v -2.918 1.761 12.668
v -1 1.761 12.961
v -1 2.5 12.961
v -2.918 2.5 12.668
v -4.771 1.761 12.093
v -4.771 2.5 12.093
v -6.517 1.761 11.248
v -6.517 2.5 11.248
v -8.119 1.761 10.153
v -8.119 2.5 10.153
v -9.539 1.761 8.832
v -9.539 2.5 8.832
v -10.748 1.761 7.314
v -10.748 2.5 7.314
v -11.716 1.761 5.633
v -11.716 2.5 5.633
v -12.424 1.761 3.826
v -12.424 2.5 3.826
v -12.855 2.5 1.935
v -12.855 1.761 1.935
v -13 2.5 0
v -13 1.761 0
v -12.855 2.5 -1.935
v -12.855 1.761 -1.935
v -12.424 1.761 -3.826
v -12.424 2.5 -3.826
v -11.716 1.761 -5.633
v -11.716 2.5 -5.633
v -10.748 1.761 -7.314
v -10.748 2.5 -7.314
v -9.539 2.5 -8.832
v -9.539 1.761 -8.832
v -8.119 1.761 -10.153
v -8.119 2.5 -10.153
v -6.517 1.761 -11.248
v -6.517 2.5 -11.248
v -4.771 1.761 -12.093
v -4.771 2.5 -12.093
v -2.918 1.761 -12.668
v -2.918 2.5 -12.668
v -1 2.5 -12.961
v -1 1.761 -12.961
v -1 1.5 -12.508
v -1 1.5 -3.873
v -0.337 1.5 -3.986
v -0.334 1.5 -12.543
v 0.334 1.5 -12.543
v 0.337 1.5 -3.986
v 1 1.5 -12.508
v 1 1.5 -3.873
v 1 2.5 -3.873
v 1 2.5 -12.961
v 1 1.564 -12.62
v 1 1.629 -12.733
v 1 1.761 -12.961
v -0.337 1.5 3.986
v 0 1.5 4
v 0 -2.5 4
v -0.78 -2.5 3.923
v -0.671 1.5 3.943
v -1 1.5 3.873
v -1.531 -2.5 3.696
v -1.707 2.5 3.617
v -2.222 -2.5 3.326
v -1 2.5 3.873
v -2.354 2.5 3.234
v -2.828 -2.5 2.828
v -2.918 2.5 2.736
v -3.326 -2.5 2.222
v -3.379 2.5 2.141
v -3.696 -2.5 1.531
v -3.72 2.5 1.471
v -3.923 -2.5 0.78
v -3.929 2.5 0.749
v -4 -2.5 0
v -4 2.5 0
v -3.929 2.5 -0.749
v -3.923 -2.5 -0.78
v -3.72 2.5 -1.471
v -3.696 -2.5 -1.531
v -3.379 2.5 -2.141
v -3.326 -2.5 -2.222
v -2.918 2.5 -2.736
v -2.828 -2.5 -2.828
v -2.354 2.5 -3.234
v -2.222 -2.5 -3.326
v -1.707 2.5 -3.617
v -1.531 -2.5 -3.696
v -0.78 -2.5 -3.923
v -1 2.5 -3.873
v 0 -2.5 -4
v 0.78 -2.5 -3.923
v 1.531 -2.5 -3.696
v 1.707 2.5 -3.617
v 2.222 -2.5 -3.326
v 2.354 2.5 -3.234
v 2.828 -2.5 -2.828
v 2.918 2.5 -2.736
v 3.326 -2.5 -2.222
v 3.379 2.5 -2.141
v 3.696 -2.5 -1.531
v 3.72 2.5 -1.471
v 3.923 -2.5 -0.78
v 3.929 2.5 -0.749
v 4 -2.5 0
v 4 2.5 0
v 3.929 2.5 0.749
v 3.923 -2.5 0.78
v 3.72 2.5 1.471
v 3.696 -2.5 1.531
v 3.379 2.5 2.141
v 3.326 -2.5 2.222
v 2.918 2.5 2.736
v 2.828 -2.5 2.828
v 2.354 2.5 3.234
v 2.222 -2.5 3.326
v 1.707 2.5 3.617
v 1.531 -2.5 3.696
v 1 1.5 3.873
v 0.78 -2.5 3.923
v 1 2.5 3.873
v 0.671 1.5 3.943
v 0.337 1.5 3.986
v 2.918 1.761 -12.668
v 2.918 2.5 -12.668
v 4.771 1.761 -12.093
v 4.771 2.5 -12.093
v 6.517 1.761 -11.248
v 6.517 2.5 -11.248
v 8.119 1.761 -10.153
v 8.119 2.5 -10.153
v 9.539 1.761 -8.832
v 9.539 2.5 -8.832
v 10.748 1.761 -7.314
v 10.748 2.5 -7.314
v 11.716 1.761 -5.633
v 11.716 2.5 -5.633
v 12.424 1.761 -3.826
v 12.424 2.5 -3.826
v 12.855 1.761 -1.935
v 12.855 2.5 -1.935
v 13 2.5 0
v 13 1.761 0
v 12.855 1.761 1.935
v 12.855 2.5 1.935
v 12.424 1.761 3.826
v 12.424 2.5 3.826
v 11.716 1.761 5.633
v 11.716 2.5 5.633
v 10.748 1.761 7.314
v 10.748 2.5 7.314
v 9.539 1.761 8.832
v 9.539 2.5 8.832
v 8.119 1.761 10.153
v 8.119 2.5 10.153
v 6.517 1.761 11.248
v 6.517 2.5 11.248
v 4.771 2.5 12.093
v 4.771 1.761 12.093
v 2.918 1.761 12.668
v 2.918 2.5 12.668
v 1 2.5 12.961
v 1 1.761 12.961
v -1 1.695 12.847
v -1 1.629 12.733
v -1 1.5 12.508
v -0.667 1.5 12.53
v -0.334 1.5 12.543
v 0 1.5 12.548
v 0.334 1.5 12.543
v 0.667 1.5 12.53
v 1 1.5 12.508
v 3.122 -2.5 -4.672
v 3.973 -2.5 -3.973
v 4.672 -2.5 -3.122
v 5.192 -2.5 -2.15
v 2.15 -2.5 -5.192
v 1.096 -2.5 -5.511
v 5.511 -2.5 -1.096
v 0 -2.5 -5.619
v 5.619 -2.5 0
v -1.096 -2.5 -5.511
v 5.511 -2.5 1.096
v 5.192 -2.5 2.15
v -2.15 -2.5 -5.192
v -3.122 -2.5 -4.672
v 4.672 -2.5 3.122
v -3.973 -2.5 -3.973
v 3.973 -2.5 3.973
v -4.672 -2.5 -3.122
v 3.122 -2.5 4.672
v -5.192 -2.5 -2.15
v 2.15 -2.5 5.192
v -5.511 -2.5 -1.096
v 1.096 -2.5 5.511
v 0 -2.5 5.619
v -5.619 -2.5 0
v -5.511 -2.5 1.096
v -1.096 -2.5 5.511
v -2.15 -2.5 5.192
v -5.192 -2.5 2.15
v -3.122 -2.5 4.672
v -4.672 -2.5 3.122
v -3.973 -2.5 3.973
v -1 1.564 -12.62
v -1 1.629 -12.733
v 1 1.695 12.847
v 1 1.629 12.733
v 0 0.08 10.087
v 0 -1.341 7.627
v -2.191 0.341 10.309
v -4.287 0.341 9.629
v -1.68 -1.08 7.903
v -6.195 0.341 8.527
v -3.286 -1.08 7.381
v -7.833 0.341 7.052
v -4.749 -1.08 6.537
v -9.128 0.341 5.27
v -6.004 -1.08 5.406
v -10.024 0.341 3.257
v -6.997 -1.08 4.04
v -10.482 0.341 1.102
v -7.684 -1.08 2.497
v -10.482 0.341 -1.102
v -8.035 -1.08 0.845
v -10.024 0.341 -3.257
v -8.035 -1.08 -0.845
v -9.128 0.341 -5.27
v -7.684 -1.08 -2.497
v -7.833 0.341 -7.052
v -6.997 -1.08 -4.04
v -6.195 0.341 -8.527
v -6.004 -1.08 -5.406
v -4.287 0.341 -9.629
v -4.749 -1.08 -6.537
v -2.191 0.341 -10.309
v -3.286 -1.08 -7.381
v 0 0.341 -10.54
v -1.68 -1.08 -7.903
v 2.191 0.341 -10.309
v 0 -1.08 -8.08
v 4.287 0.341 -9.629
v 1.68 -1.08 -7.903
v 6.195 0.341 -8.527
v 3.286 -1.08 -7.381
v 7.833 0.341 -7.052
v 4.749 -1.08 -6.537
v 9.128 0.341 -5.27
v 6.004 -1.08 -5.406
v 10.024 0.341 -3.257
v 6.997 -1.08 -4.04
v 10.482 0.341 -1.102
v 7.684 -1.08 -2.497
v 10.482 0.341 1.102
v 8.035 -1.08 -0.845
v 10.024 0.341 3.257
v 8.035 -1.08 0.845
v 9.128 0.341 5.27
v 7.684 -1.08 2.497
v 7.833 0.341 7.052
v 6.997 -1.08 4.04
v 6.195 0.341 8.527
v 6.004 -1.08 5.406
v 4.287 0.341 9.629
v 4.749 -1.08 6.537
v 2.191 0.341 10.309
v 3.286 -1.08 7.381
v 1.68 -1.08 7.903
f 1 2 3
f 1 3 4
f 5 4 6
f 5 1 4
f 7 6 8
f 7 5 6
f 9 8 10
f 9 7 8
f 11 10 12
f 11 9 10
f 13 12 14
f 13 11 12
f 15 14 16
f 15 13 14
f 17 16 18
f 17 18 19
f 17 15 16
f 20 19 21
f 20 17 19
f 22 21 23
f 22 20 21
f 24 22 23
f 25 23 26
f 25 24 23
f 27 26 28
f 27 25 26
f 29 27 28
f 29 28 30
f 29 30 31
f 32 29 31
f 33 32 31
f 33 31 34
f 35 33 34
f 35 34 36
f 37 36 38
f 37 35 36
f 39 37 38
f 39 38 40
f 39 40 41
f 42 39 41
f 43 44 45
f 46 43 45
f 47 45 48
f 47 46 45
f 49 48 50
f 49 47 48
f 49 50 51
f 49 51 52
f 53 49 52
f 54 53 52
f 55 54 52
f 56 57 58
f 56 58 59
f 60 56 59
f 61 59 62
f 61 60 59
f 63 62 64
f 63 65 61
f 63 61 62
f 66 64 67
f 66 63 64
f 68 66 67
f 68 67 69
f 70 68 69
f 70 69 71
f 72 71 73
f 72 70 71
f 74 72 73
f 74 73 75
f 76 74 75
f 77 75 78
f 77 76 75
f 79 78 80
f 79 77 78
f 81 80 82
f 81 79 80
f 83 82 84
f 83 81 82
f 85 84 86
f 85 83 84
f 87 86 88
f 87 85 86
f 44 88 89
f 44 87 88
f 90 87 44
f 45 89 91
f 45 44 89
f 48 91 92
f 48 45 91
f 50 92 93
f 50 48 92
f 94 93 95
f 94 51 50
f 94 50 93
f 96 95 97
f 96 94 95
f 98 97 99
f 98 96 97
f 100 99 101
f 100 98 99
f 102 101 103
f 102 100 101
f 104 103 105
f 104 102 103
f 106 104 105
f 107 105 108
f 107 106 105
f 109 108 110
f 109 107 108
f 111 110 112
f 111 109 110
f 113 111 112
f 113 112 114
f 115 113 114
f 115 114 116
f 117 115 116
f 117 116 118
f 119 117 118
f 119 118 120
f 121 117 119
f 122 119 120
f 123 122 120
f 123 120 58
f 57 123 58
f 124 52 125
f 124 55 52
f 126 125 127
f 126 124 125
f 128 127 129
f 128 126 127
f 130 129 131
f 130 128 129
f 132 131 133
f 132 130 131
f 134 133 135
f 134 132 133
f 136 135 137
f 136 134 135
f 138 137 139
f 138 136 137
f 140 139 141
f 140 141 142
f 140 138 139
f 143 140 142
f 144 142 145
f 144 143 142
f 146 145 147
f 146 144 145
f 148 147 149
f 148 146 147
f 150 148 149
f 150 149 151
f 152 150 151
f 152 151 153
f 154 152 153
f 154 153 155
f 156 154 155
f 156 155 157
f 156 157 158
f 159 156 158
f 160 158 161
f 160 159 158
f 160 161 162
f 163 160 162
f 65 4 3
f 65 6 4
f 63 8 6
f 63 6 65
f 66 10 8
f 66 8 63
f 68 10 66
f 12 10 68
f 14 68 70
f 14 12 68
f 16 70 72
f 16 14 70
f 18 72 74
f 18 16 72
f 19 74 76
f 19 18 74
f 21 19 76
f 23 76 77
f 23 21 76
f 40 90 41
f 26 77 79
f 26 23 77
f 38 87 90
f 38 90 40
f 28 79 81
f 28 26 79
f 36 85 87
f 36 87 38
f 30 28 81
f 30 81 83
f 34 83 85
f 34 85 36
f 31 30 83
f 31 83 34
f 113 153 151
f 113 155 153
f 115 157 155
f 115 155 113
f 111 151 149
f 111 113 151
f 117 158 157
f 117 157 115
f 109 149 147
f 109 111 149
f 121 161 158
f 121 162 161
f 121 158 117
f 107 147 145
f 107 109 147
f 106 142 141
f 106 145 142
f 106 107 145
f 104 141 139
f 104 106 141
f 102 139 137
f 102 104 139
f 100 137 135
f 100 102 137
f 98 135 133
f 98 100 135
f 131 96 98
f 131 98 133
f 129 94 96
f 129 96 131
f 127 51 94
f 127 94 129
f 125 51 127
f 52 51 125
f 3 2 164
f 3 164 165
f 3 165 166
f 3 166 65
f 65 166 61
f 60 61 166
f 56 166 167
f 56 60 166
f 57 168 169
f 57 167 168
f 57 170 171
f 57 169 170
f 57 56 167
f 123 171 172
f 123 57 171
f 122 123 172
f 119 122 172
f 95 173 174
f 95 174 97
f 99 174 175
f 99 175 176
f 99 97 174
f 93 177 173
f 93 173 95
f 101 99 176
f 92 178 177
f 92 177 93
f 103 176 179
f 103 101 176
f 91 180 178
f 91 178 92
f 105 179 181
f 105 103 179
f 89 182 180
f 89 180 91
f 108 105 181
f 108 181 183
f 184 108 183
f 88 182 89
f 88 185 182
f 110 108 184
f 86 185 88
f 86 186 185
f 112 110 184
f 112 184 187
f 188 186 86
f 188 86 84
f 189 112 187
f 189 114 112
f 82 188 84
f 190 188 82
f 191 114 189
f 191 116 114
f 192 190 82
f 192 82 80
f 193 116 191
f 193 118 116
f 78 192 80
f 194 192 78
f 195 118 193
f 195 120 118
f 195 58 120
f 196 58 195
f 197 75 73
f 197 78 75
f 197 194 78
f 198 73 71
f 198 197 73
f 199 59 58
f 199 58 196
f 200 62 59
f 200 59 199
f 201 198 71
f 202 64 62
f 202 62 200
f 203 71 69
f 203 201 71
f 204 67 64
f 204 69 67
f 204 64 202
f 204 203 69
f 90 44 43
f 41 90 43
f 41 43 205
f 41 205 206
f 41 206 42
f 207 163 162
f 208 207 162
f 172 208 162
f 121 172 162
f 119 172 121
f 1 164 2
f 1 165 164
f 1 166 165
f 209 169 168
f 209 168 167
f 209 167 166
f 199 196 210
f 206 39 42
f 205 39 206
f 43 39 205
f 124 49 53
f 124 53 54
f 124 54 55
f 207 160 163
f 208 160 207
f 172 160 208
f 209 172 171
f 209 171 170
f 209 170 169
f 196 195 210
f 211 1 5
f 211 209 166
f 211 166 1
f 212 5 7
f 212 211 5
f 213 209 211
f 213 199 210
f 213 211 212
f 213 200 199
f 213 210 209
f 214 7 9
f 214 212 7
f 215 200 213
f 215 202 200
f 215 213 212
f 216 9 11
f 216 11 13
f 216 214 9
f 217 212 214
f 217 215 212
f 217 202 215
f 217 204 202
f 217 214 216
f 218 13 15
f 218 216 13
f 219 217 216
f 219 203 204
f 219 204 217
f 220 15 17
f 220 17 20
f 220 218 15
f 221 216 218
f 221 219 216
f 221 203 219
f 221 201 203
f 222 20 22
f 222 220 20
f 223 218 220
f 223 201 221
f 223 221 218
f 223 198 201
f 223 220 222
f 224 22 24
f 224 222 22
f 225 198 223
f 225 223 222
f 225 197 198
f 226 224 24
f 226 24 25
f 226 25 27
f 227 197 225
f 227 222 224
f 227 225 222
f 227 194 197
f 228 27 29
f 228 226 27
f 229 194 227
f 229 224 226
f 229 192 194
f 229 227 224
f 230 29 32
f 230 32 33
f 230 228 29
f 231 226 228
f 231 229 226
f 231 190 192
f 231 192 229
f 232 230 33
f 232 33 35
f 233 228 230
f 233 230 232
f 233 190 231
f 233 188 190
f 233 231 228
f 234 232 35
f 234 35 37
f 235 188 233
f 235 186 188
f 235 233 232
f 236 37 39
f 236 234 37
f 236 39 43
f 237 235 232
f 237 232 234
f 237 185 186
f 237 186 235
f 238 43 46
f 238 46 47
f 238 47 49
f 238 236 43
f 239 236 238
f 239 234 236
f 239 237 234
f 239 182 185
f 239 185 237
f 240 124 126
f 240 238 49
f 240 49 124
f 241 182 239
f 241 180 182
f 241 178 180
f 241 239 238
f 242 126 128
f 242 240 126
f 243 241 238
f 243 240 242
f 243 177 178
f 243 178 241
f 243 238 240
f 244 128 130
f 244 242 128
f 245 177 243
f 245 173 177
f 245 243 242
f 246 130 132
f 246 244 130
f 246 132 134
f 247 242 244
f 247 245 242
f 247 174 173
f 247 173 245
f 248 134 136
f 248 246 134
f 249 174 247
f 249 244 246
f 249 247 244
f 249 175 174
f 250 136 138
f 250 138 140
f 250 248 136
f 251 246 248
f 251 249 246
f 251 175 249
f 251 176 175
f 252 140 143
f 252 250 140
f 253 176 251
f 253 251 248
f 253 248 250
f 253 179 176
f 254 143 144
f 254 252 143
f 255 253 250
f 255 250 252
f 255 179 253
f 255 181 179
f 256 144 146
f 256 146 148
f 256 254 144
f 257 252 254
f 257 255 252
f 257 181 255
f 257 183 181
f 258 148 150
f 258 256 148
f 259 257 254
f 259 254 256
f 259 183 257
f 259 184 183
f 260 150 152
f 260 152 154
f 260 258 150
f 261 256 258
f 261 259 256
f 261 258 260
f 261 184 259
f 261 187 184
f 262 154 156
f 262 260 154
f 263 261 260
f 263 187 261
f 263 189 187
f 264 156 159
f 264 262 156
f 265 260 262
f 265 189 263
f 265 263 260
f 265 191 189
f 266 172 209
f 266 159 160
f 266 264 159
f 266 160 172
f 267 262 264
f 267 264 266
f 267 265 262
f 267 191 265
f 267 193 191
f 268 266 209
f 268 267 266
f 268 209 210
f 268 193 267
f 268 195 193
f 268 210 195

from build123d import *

# Parameters (mm, degrees)
CUT_EXTRUDE_THIN2_DEPTH      = 20.052558883
CUT_EXTRUDE_THIN2_DEPTH_BACK = 1
SKETCH2_W                    = 2
SKETCH2_H                    = 26


with BuildPart() as part:
    # Sketch1 → Revolve1 (revolve)
    with BuildSketch(Plane(origin=(0, 0, 0), x_dir=(0, 0, -1), z_dir=(1, 0, 0))):
        Polygon((-13, 1.761213565), (-5.619361604, -2.5), (-4, -2.5), (-4, 2.5), (-13, 2.5), align=None)
    revolve(axis=Axis((0, 36.09806212, 0), (0, -1, 0)))

    # Sketch2 → Cut-Extrude-Thin2 (cut, two sides: drawn at the far end of the back side and taken through both)
    with BuildSketch(Plane(origin=(0, 2.5, 0), x_dir=(1, 0, 0), z_dir=(0, 1, 0)).offset(-CUT_EXTRUDE_THIN2_DEPTH_BACK)):
        Rectangle(SKETCH2_W, SKETCH2_H)
    extrude(amount=CUT_EXTRUDE_THIN2_DEPTH + CUT_EXTRUDE_THIN2_DEPTH_BACK, mode=Mode.SUBTRACT)


solid = part.part
